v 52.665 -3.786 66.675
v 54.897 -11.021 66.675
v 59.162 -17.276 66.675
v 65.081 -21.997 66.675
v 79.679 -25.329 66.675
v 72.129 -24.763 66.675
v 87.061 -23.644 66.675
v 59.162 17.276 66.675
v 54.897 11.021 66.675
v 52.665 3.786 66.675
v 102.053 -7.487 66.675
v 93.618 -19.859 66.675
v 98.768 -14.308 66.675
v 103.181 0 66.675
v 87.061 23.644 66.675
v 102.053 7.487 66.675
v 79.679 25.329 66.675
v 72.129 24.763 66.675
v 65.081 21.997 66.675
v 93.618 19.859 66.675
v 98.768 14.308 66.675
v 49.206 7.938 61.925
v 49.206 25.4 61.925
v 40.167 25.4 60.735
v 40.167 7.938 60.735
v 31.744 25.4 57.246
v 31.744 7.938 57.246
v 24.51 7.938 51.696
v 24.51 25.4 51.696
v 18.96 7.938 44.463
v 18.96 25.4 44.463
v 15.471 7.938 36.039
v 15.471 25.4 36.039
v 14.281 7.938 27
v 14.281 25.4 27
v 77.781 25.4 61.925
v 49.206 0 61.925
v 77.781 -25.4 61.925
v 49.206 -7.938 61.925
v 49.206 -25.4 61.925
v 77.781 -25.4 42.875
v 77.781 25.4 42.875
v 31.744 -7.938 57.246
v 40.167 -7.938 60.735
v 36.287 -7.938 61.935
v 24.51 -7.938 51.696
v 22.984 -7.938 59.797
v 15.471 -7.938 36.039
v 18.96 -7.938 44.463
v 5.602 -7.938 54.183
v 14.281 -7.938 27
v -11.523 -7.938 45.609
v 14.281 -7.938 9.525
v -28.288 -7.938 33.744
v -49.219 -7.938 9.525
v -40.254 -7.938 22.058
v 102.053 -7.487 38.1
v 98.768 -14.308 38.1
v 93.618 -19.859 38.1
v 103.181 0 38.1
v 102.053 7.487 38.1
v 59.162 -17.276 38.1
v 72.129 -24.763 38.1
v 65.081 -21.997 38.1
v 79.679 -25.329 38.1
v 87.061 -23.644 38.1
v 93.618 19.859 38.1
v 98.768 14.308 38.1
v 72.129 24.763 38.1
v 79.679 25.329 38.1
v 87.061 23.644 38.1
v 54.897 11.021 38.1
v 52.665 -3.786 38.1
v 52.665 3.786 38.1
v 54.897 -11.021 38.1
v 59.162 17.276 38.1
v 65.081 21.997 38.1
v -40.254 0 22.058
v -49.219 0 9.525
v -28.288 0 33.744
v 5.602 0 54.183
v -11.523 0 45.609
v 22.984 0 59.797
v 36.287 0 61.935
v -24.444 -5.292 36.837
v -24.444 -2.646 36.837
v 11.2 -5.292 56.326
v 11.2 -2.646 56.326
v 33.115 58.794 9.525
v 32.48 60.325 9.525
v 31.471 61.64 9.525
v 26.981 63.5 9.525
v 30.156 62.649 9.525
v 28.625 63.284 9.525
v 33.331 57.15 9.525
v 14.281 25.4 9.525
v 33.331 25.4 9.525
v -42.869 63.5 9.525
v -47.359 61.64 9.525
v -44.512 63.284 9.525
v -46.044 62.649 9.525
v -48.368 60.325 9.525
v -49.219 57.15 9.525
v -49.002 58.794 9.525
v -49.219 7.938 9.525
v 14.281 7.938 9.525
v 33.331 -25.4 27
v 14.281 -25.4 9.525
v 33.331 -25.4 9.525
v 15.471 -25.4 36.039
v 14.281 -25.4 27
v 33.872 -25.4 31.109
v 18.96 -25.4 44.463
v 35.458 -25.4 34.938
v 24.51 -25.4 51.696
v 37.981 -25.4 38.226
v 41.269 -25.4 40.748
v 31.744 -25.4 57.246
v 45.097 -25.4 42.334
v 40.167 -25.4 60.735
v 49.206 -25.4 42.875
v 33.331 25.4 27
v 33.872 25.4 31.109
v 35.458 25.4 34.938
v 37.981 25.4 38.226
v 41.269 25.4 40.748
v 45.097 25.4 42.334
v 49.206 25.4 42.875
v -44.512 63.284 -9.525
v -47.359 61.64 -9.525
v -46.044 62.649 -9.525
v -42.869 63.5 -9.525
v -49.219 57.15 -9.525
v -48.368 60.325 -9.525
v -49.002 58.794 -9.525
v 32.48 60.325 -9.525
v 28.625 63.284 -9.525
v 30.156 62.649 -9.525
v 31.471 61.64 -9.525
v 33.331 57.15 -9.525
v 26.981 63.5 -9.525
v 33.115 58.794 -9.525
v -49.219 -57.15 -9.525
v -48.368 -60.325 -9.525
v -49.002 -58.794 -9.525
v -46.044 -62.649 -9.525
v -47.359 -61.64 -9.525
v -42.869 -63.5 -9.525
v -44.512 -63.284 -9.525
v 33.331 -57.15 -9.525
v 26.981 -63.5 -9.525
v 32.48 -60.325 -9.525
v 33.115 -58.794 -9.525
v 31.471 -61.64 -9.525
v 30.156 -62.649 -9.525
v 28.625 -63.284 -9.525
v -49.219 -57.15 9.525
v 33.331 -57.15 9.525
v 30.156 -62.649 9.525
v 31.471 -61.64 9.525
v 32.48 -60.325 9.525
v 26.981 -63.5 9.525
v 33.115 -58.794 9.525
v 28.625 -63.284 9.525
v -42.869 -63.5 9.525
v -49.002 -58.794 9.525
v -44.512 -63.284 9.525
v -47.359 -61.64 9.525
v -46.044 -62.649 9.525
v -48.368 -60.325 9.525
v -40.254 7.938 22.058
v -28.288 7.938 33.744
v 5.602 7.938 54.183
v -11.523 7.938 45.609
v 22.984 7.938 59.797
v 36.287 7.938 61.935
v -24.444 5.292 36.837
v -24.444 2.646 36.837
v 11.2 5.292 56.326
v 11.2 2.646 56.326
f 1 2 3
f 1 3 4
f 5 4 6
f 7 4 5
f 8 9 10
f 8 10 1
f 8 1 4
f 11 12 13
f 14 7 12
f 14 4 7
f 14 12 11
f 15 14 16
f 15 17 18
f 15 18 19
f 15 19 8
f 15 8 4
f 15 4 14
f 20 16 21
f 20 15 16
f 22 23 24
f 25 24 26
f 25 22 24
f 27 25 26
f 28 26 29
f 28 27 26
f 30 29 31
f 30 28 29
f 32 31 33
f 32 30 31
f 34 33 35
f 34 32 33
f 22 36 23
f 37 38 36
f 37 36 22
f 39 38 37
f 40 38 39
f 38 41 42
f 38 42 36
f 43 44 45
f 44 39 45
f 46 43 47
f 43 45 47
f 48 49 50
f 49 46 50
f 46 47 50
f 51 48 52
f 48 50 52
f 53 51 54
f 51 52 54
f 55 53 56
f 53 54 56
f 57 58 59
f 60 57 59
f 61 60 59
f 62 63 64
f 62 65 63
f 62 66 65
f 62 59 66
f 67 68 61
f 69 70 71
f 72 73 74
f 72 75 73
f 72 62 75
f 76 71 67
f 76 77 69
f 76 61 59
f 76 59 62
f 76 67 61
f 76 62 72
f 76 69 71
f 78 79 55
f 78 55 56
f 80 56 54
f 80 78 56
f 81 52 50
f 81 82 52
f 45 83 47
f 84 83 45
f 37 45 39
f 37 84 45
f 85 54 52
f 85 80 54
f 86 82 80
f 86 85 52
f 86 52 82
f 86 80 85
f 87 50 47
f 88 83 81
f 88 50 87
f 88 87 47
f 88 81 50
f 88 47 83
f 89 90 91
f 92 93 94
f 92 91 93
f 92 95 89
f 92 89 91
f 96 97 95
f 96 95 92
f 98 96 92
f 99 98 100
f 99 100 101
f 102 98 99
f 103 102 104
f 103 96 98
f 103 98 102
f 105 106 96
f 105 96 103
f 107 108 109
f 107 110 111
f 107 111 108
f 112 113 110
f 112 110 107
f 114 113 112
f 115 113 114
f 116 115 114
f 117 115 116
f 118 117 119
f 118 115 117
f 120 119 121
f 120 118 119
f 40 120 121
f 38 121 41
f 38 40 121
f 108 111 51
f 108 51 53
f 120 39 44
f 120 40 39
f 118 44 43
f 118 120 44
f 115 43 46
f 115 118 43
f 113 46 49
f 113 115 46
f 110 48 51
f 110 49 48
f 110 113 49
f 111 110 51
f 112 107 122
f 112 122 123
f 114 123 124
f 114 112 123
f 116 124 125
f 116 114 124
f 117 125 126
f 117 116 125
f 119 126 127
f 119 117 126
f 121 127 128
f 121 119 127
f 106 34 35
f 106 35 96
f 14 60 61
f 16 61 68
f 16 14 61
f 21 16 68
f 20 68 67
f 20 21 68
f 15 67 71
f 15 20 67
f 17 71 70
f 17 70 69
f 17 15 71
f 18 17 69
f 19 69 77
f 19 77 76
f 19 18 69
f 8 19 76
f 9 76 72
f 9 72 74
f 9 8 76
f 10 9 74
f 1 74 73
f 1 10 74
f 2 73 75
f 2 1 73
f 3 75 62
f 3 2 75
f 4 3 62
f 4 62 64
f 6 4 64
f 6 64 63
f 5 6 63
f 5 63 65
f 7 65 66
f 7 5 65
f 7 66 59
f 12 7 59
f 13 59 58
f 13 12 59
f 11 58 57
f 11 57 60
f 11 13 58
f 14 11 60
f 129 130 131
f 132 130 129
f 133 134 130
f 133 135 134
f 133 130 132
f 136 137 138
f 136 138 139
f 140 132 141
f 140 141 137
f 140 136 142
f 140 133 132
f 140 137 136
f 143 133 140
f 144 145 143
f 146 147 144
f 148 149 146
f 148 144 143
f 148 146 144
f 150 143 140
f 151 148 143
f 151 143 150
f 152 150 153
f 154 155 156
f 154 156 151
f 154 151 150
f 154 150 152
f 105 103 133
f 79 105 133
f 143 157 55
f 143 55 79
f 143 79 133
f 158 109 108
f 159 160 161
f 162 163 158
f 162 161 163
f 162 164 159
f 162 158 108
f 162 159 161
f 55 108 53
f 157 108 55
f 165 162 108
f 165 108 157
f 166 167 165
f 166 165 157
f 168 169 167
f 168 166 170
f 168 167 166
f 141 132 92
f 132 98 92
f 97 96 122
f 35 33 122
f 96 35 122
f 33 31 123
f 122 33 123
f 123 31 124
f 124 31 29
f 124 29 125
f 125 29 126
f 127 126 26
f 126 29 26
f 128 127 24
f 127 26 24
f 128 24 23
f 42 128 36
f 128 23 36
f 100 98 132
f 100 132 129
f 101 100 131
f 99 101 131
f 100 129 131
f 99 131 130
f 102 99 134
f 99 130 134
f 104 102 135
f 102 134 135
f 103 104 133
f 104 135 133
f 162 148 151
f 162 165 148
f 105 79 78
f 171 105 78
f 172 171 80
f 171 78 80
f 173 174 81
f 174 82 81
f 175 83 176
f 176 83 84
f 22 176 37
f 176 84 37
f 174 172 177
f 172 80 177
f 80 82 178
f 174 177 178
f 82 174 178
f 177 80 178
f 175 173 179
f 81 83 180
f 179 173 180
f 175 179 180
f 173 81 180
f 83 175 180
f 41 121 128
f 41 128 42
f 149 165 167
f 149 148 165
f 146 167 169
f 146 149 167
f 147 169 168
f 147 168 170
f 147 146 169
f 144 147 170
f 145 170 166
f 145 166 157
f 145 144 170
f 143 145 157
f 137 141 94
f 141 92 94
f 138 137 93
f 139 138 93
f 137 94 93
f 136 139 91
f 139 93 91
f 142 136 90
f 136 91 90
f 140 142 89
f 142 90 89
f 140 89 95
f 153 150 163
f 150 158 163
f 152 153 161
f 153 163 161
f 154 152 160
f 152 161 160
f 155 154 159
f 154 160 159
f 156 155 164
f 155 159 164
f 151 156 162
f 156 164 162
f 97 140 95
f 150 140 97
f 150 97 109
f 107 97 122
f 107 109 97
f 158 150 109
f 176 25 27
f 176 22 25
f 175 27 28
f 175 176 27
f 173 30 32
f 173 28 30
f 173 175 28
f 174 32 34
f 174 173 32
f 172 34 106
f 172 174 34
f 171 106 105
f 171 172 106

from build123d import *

# Parameters (mm, degrees)
F1_DEPTH = 63.5
F0_W     = 25.4
F0_H     = 19.05
F2_DEPTH = 25.4
F3_DEPTH = 7.9375
F5_R     = 6.35


with BuildPart() as f1:
    # F0 (on Front) → F1 (new body, symmetric)
    with BuildSketch(Plane.XZ):
        Polygon((-49.2188632803, -9.525), (33.3311367197, -9.525), (33.3311367197, 9.525), (14.2811367197, 9.525), (-49.2188632803, 9.525), align=None)
    extrude(amount=F1_DEPTH, both=True)

    # F0 (on Front) → F2 (join, symmetric)
    with BuildSketch(Plane.XZ):
        with BuildLine():
            Line((14.2811367197, 9.525), (33.3311367197, 9.525))
            Line((33.3311367197, 9.525), (33.3311367197, 27.0002))
            ThreePointArc((33.3311367197, 27.0002), (37.9808165684, 38.2255201513), (49.2061367197, 42.8752))
            Line((49.2061367197, 42.8752), (52.3811367197, 42.8752))
            Line((52.3811367197, 42.8752), (52.3811367197, 61.9252))
            Line((52.3811367197, 61.9252), (49.2061367197, 61.9252))
            ThreePointArc((49.2061367197, 61.9252), (24.5104323868, 51.6959043329), (14.2811367197, 27.0002))
            Line((14.2811367197, 27.0002), (14.2811367197, 9.525))
        make_face()
        with Locations((65.0811367197, 52.4002)):
            Rectangle(F0_W, F0_H)
    extrude(amount=F2_DEPTH, both=True)

    # F0 (on Front) → F3 (join, symmetric)
    with BuildSketch(Plane.XZ):
        with BuildLine():
            add(Edge.make_bspline(
                [(-49.2188632803, 9.525), (-32.7156037092, 38.7257821858), (12.8561593592, 65.2922838926), (49.2061367197, 61.9252)],
                knots=[0, 0, 0, 0, 111.5045361635, 111.5045361635, 111.5045361635, 111.5045361635], degree=3))
            Line((-49.2188632803, 9.525), (14.2811367197, 9.525))
            Line((14.2811367197, 9.525), (14.2811367197, 27.0002))
            ThreePointArc((14.2811367197, 27.0002), (24.5104323868, 51.6959043329), (49.2061367197, 61.9252))
        make_face()
    extrude(amount=F3_DEPTH, both=True)

    # F5
    f5_edges = [f1.edges().sort_by_distance(p)[0] for p in [
        (-49.218863, -63.5, 0),
        (33.331137, -63.5, 0),
        (33.331137, 63.5, 0),
        (-49.218863, 63.5, 0),
    ]]
    fillet(f5_edges, radius=F5_R)


with BuildPart() as f4:
    # F0 (on Front) → F4 (revolve)
    with BuildSketch(Plane.XZ):
        Polygon((77.7811367197, 66.675), (77.7811367197, 61.9252), (77.7811367197, 42.8752), (77.7811367197, 38.1), (103.1811367197, 38.1), (103.1811367197, 66.675), align=None)
    revolve(axis=Axis((77.7811367197, 0, 52.3875), (0, 0, 1)))


solid = Compound([f1.part, f4.part])
